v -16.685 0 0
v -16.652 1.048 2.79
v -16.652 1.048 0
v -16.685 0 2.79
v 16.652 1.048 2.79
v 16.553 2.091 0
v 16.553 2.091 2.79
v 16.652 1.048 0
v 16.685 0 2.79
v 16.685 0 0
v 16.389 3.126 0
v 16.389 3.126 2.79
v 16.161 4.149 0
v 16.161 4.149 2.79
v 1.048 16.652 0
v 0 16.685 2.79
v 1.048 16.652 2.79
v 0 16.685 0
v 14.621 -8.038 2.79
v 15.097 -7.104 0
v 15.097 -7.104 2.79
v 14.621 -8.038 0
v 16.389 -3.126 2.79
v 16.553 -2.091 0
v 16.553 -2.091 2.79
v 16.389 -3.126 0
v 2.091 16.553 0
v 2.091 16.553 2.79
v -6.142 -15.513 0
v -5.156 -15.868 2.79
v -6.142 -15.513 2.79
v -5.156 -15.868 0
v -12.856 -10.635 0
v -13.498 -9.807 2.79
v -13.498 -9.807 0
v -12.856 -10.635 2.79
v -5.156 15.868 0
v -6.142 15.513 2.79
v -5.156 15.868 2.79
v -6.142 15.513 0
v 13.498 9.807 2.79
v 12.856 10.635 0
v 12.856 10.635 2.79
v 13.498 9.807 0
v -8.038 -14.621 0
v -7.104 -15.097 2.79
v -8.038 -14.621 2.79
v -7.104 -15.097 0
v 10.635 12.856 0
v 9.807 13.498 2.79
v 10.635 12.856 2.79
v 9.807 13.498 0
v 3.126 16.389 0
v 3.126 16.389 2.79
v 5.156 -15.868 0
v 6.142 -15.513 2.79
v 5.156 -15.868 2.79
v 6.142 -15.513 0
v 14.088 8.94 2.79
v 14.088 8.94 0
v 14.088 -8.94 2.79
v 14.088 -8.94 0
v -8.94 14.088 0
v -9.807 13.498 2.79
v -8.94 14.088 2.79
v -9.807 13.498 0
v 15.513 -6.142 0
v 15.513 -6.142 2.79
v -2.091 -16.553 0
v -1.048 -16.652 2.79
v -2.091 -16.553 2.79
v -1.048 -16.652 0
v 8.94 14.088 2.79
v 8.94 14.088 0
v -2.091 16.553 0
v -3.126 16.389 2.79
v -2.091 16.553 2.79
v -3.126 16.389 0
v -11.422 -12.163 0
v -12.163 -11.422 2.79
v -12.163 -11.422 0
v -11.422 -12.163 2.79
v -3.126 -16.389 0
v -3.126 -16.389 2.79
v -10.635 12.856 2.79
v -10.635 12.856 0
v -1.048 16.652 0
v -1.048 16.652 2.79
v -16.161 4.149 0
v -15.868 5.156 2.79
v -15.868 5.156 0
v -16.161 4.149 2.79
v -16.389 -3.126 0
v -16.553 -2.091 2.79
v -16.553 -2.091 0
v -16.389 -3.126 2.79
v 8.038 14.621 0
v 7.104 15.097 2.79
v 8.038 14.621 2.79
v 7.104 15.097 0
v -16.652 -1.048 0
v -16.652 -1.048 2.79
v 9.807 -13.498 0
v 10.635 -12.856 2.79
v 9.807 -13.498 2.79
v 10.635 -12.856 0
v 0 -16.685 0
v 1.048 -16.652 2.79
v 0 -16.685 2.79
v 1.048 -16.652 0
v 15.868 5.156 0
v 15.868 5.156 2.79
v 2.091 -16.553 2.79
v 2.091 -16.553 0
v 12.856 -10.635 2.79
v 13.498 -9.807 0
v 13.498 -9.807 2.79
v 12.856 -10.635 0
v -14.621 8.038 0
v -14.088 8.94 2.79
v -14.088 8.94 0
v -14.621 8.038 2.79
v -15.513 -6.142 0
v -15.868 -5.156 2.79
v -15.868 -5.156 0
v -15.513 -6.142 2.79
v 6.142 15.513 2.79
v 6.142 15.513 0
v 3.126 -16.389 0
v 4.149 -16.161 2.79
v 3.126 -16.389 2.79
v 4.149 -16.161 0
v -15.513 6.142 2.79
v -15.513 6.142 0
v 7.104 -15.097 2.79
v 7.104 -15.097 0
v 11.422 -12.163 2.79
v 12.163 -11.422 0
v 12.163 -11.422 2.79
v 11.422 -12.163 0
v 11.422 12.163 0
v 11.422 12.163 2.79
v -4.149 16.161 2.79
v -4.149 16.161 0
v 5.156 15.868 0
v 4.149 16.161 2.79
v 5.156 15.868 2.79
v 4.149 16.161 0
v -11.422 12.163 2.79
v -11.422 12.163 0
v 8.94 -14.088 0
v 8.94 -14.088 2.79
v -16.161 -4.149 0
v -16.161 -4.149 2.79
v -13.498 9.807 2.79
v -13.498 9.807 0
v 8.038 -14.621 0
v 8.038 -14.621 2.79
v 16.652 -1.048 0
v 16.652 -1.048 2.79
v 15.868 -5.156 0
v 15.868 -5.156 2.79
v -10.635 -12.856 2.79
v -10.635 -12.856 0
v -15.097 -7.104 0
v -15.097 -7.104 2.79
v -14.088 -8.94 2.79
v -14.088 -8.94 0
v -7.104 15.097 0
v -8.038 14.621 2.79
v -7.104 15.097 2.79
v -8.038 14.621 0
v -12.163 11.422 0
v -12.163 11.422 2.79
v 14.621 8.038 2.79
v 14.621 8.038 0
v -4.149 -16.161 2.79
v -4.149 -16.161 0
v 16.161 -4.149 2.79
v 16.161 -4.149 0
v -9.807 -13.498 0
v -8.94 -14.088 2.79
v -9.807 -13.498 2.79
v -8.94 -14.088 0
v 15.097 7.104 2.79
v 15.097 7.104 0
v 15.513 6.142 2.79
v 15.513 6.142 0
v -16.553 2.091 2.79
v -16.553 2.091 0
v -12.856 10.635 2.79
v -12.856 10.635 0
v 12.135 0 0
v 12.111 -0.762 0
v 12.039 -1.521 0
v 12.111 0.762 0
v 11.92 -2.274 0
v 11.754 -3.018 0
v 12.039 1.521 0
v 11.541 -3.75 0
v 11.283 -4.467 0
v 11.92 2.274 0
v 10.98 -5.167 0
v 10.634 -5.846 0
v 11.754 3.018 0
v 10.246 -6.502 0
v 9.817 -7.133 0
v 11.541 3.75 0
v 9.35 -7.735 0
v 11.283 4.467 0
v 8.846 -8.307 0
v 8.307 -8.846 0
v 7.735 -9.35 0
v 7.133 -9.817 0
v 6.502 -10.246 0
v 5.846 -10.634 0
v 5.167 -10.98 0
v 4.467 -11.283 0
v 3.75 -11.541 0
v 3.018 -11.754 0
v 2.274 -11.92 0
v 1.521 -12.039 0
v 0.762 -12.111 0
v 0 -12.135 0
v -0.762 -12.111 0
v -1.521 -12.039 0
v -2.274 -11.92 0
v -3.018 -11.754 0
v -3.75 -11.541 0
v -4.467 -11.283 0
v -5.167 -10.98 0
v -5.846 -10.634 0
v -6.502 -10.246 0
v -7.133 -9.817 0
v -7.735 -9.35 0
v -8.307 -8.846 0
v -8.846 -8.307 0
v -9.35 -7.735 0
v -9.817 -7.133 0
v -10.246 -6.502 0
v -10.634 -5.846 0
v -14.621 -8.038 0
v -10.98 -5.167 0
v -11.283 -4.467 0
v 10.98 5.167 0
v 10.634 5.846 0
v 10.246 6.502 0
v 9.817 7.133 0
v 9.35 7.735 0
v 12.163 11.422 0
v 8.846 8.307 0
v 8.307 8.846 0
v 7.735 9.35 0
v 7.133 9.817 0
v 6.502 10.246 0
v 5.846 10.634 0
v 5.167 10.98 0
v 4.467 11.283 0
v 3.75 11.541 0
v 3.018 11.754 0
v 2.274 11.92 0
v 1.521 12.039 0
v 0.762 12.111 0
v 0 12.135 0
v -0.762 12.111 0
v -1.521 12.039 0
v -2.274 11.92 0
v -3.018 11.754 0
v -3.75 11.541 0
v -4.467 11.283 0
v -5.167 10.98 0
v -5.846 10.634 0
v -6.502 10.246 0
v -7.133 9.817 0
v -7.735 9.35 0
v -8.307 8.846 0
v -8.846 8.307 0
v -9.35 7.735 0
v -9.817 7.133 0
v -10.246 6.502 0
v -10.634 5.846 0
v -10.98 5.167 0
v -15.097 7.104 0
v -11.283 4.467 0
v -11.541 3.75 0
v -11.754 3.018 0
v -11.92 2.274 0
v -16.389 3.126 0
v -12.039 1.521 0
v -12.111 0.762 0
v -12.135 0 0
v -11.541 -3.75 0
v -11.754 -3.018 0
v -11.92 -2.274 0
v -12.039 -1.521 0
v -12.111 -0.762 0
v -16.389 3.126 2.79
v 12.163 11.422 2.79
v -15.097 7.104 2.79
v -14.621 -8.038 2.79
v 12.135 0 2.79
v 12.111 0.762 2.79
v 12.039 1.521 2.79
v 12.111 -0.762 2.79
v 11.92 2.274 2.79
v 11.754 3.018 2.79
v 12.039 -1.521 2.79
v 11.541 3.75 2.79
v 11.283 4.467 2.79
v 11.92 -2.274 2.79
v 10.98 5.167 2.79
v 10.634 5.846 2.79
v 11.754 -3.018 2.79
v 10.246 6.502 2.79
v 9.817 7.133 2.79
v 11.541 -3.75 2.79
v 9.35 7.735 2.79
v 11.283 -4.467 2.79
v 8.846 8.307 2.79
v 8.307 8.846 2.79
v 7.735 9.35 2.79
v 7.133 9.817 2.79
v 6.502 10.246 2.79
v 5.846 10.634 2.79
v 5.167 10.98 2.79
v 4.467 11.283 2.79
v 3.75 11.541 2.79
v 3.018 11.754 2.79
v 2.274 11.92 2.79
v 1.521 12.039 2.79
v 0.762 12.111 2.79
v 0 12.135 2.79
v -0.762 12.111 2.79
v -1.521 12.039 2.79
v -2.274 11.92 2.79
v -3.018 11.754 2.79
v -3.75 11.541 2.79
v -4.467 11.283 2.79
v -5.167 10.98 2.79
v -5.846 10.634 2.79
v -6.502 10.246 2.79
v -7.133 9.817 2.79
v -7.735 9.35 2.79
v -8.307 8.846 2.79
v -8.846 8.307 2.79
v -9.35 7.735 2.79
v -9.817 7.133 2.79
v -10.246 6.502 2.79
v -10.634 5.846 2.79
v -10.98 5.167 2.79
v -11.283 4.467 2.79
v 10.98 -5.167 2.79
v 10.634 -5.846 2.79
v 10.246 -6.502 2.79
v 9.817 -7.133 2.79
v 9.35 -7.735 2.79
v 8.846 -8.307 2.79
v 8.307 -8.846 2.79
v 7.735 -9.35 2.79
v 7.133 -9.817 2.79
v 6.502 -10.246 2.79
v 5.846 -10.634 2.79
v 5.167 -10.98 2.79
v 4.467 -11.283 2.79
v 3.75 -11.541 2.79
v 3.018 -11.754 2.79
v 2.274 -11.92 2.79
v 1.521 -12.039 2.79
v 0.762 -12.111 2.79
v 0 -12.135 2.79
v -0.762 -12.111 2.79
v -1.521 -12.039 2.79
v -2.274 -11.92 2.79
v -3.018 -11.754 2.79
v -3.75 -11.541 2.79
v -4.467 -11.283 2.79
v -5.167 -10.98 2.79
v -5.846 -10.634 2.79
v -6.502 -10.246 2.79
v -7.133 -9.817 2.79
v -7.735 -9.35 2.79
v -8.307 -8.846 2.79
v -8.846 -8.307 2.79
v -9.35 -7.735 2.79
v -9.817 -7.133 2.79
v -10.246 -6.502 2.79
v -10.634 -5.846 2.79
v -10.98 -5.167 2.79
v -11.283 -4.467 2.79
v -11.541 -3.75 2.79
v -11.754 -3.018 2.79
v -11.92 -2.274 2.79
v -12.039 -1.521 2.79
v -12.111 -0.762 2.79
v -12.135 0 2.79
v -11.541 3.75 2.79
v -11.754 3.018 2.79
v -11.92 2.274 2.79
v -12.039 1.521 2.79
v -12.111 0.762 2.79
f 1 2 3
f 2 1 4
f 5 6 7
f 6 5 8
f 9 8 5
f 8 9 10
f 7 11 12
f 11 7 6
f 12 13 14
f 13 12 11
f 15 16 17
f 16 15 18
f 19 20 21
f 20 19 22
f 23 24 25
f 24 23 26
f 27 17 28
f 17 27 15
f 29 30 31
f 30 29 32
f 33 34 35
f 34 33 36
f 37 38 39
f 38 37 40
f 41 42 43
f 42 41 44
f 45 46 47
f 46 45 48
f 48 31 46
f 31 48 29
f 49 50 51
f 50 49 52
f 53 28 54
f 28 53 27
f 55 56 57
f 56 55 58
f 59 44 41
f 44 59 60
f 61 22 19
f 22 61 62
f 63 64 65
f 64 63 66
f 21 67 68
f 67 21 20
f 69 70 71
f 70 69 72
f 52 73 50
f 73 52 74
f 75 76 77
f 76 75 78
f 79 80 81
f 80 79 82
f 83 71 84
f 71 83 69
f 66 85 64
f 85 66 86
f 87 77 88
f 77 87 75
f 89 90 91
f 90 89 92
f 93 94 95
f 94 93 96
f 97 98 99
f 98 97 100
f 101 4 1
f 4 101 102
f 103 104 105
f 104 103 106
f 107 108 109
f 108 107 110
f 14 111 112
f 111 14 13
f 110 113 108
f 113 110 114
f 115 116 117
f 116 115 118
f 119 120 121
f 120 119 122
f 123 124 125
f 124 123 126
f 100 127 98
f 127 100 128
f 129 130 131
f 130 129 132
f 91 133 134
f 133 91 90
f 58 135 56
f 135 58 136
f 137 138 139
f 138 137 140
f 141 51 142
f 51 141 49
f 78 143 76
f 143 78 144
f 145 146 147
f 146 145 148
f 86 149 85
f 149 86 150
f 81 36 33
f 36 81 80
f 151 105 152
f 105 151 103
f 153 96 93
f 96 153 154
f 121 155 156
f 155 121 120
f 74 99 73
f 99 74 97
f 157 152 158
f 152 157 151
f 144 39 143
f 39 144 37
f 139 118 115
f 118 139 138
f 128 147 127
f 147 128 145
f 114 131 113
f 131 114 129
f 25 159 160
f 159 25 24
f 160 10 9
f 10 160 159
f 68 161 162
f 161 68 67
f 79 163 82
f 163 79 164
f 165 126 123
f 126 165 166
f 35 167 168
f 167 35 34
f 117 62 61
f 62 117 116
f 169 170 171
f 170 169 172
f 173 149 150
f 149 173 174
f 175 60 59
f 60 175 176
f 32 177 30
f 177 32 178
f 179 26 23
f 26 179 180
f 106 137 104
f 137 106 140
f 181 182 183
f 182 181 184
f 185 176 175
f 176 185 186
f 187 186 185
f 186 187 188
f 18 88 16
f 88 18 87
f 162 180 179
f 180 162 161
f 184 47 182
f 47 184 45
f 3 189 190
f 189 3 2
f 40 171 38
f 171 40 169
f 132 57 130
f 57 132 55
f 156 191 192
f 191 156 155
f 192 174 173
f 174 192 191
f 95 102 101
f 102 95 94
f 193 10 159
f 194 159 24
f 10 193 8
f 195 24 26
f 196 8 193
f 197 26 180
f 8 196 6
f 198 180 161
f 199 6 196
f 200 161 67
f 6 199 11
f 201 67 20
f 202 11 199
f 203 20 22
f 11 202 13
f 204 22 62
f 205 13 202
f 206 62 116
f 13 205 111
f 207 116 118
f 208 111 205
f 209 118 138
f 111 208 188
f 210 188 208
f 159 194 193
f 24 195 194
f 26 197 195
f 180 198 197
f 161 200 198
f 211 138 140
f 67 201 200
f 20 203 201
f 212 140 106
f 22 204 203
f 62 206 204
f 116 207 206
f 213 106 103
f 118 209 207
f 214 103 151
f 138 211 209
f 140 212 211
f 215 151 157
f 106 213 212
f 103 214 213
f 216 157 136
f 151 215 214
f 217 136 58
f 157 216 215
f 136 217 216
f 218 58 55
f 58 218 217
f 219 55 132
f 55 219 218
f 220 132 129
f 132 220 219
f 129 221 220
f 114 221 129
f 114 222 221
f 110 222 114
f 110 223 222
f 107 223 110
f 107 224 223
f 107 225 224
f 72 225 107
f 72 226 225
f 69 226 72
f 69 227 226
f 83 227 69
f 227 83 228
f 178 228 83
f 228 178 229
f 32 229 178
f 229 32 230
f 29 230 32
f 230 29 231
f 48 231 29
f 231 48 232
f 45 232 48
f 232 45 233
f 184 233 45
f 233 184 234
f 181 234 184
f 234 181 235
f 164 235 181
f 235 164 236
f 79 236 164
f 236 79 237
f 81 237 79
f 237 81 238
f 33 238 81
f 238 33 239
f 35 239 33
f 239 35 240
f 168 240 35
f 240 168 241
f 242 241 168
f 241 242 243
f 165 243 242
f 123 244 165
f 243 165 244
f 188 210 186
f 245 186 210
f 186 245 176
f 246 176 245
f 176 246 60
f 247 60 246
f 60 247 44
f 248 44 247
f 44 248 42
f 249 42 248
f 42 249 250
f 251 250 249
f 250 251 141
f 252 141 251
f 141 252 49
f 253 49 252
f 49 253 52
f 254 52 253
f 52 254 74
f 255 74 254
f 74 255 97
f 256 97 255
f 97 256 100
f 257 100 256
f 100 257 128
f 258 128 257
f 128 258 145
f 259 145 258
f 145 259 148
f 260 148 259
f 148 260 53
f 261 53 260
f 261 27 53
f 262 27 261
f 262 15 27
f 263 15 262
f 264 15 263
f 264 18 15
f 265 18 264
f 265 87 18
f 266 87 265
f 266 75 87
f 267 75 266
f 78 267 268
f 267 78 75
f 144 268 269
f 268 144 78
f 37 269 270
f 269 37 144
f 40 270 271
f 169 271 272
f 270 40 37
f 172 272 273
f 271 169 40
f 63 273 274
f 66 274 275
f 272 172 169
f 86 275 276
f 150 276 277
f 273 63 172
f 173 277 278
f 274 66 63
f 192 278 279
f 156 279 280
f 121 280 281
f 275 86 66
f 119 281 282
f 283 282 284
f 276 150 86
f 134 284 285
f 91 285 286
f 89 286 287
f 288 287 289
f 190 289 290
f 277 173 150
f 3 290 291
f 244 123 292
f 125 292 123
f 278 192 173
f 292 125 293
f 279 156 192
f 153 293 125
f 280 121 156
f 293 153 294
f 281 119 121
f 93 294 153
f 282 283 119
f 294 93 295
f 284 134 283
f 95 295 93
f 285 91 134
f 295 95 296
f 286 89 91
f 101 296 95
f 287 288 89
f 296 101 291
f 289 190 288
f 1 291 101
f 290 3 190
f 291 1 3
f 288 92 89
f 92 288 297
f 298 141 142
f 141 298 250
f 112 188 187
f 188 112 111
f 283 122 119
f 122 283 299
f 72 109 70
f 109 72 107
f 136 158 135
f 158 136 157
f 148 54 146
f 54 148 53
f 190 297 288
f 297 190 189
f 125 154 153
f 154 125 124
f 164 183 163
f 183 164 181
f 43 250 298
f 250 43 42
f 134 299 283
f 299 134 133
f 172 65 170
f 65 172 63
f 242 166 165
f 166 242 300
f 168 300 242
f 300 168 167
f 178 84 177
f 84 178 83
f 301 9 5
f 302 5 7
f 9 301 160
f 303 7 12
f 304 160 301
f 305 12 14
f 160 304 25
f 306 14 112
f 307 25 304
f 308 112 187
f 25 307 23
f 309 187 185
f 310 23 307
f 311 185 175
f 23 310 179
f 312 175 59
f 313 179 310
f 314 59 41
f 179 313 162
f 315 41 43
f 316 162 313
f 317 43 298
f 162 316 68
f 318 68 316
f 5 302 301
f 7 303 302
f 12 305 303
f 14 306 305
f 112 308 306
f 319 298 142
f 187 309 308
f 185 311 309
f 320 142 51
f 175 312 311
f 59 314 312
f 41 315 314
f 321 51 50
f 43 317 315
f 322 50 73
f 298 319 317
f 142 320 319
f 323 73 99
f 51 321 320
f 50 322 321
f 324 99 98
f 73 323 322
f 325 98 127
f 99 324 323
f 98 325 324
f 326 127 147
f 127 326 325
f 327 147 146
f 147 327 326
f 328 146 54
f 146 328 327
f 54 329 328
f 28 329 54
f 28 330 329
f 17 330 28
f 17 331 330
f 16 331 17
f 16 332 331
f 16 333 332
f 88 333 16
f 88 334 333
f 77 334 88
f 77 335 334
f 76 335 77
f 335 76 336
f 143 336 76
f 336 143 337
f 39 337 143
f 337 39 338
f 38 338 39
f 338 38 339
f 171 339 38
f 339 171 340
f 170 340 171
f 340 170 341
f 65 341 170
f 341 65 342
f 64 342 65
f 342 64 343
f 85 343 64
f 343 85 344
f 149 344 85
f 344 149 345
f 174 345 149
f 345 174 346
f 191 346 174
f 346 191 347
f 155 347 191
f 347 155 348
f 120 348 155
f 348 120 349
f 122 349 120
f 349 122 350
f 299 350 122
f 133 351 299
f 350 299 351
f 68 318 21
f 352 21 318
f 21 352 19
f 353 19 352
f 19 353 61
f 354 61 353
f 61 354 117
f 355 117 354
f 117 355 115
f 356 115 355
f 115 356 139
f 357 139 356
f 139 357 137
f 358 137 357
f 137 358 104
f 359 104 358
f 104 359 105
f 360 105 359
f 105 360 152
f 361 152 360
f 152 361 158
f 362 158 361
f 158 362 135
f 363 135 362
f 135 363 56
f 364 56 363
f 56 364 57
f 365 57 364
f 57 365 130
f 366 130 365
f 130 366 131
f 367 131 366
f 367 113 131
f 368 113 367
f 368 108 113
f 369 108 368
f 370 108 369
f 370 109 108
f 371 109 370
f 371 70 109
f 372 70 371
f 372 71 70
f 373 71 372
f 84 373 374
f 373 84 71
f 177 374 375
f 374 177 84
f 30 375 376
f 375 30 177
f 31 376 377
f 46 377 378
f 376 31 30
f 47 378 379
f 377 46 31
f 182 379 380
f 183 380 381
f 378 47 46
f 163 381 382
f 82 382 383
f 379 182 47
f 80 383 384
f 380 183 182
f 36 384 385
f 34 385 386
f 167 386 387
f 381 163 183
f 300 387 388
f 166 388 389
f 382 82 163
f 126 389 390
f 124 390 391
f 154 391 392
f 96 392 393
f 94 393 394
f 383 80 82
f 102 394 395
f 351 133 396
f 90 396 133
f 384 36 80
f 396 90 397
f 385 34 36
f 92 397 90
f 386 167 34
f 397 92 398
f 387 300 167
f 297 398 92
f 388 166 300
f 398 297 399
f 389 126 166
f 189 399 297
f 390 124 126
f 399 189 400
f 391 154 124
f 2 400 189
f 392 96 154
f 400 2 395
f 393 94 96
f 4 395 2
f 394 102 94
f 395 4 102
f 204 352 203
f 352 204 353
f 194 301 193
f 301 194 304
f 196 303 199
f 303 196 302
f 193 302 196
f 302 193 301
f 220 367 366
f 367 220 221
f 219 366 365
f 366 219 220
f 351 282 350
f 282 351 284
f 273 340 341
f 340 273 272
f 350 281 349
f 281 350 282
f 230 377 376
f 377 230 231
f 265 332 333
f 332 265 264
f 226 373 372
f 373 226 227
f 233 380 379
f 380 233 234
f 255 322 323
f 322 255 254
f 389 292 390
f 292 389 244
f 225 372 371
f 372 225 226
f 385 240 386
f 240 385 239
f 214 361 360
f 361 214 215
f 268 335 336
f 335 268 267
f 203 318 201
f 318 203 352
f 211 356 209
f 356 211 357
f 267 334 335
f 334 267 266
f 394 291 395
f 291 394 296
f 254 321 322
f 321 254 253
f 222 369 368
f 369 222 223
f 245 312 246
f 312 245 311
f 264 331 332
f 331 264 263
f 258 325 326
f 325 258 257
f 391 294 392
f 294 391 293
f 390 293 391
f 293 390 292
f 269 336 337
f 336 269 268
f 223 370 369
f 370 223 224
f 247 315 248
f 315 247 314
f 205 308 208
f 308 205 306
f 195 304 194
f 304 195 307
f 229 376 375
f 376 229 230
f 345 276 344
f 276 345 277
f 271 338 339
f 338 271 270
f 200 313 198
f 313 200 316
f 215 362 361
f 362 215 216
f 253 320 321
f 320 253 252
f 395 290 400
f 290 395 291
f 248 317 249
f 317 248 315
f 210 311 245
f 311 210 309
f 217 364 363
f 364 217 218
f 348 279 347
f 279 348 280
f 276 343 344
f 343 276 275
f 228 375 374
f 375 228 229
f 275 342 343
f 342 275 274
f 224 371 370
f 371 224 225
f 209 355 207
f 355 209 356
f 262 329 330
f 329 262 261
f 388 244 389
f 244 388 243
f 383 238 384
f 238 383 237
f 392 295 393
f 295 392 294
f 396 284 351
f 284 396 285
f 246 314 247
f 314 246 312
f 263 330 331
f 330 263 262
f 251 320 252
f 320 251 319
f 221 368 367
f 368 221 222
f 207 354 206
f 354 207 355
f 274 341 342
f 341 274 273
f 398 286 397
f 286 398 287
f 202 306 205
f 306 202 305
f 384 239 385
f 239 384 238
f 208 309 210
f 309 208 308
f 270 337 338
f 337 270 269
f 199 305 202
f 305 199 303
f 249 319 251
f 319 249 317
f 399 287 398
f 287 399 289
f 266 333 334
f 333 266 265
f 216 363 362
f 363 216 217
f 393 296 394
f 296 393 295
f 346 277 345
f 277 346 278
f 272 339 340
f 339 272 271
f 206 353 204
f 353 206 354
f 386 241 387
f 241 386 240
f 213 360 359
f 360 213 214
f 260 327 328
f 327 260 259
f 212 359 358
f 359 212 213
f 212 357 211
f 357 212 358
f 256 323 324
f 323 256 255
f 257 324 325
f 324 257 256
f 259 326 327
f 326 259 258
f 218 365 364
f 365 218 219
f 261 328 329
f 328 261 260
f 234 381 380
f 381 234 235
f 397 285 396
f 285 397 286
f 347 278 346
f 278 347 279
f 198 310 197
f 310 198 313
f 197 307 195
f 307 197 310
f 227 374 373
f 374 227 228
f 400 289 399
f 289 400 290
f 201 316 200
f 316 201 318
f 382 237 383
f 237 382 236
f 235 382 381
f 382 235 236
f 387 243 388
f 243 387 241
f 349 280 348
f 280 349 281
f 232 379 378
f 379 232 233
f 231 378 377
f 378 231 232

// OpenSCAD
/*
Description: As it looks like Trucore hardware is no longer available, this is an attempt to model the truCore motors so that rocketers can get spare parts with help from a machinist
Author: Boris du Reau
Date: 23/07/2018
motor type: 38 mm 
part: Washer
This is used for all the 38mm motors
washer outside diameter: 33.37 mm
washer height: 2.79 mm
washer inside diameter: 24.27 mm
*/

$fn=100;
difference () {cylinder (r= 33.37/2, h = 2.79);
cylinder (r=24.27/2, h = 10);
}
